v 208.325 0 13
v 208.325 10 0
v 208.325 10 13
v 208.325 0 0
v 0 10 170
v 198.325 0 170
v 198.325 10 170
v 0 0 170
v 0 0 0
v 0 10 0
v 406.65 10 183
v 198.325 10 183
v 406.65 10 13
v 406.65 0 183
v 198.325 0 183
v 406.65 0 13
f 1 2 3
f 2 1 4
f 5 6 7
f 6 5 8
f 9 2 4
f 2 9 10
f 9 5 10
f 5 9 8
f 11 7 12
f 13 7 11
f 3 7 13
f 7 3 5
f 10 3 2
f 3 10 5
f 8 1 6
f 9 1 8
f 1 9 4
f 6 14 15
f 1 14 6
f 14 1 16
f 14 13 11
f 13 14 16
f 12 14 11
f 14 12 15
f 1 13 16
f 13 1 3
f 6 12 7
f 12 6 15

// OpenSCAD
// Test script for 16-inch 2-block interlocked span with half-tooth Z-offset
num_teeth = 5;
tooth_height = 26.0;
tooth_depth = 10.0;
corner_bevel = 20.0;
clearance = 0.25;

// Calculated width for 2 interlocked blocks to span exactly 16 inches (406.4 mm)
span_16in = 16.0 * 25.4; // 406.4 mm
W = (span_16in + tooth_depth + clearance) / 2; // 208.325 mm (~8.20 inches)

h_wall = num_teeth * tooth_height;
H = 2 * corner_bevel + h_wall;

// Half-tooth Z offset for alternating modules
z_offset_alt = tooth_height / 2;

echo(str("CALCULATED MODULE WIDTH: ", W, " mm (", W/25.4, " inches)"));
echo(str("2-BLOCK INTERLOCKED SPAN: ", 2*W - tooth_depth - clearance, " mm (", (2*W - tooth_depth - clearance)/25.4, " inches)"));

// Render 2 interlocking modules
// Module 1 (Cyan) at X=0, Z=0
color([0.25, 0.55, 0.85])
translate([0, 0, 0])
cube([W, 10, H]); // placeholder bounding box check

// Module 2 (Orange) at X = W - tooth_depth, Z = z_offset_alt
color([0.90, 0.45, 0.25])
translate([W - tooth_depth, 0, z_offset_alt])
cube([W, 10, H]);
